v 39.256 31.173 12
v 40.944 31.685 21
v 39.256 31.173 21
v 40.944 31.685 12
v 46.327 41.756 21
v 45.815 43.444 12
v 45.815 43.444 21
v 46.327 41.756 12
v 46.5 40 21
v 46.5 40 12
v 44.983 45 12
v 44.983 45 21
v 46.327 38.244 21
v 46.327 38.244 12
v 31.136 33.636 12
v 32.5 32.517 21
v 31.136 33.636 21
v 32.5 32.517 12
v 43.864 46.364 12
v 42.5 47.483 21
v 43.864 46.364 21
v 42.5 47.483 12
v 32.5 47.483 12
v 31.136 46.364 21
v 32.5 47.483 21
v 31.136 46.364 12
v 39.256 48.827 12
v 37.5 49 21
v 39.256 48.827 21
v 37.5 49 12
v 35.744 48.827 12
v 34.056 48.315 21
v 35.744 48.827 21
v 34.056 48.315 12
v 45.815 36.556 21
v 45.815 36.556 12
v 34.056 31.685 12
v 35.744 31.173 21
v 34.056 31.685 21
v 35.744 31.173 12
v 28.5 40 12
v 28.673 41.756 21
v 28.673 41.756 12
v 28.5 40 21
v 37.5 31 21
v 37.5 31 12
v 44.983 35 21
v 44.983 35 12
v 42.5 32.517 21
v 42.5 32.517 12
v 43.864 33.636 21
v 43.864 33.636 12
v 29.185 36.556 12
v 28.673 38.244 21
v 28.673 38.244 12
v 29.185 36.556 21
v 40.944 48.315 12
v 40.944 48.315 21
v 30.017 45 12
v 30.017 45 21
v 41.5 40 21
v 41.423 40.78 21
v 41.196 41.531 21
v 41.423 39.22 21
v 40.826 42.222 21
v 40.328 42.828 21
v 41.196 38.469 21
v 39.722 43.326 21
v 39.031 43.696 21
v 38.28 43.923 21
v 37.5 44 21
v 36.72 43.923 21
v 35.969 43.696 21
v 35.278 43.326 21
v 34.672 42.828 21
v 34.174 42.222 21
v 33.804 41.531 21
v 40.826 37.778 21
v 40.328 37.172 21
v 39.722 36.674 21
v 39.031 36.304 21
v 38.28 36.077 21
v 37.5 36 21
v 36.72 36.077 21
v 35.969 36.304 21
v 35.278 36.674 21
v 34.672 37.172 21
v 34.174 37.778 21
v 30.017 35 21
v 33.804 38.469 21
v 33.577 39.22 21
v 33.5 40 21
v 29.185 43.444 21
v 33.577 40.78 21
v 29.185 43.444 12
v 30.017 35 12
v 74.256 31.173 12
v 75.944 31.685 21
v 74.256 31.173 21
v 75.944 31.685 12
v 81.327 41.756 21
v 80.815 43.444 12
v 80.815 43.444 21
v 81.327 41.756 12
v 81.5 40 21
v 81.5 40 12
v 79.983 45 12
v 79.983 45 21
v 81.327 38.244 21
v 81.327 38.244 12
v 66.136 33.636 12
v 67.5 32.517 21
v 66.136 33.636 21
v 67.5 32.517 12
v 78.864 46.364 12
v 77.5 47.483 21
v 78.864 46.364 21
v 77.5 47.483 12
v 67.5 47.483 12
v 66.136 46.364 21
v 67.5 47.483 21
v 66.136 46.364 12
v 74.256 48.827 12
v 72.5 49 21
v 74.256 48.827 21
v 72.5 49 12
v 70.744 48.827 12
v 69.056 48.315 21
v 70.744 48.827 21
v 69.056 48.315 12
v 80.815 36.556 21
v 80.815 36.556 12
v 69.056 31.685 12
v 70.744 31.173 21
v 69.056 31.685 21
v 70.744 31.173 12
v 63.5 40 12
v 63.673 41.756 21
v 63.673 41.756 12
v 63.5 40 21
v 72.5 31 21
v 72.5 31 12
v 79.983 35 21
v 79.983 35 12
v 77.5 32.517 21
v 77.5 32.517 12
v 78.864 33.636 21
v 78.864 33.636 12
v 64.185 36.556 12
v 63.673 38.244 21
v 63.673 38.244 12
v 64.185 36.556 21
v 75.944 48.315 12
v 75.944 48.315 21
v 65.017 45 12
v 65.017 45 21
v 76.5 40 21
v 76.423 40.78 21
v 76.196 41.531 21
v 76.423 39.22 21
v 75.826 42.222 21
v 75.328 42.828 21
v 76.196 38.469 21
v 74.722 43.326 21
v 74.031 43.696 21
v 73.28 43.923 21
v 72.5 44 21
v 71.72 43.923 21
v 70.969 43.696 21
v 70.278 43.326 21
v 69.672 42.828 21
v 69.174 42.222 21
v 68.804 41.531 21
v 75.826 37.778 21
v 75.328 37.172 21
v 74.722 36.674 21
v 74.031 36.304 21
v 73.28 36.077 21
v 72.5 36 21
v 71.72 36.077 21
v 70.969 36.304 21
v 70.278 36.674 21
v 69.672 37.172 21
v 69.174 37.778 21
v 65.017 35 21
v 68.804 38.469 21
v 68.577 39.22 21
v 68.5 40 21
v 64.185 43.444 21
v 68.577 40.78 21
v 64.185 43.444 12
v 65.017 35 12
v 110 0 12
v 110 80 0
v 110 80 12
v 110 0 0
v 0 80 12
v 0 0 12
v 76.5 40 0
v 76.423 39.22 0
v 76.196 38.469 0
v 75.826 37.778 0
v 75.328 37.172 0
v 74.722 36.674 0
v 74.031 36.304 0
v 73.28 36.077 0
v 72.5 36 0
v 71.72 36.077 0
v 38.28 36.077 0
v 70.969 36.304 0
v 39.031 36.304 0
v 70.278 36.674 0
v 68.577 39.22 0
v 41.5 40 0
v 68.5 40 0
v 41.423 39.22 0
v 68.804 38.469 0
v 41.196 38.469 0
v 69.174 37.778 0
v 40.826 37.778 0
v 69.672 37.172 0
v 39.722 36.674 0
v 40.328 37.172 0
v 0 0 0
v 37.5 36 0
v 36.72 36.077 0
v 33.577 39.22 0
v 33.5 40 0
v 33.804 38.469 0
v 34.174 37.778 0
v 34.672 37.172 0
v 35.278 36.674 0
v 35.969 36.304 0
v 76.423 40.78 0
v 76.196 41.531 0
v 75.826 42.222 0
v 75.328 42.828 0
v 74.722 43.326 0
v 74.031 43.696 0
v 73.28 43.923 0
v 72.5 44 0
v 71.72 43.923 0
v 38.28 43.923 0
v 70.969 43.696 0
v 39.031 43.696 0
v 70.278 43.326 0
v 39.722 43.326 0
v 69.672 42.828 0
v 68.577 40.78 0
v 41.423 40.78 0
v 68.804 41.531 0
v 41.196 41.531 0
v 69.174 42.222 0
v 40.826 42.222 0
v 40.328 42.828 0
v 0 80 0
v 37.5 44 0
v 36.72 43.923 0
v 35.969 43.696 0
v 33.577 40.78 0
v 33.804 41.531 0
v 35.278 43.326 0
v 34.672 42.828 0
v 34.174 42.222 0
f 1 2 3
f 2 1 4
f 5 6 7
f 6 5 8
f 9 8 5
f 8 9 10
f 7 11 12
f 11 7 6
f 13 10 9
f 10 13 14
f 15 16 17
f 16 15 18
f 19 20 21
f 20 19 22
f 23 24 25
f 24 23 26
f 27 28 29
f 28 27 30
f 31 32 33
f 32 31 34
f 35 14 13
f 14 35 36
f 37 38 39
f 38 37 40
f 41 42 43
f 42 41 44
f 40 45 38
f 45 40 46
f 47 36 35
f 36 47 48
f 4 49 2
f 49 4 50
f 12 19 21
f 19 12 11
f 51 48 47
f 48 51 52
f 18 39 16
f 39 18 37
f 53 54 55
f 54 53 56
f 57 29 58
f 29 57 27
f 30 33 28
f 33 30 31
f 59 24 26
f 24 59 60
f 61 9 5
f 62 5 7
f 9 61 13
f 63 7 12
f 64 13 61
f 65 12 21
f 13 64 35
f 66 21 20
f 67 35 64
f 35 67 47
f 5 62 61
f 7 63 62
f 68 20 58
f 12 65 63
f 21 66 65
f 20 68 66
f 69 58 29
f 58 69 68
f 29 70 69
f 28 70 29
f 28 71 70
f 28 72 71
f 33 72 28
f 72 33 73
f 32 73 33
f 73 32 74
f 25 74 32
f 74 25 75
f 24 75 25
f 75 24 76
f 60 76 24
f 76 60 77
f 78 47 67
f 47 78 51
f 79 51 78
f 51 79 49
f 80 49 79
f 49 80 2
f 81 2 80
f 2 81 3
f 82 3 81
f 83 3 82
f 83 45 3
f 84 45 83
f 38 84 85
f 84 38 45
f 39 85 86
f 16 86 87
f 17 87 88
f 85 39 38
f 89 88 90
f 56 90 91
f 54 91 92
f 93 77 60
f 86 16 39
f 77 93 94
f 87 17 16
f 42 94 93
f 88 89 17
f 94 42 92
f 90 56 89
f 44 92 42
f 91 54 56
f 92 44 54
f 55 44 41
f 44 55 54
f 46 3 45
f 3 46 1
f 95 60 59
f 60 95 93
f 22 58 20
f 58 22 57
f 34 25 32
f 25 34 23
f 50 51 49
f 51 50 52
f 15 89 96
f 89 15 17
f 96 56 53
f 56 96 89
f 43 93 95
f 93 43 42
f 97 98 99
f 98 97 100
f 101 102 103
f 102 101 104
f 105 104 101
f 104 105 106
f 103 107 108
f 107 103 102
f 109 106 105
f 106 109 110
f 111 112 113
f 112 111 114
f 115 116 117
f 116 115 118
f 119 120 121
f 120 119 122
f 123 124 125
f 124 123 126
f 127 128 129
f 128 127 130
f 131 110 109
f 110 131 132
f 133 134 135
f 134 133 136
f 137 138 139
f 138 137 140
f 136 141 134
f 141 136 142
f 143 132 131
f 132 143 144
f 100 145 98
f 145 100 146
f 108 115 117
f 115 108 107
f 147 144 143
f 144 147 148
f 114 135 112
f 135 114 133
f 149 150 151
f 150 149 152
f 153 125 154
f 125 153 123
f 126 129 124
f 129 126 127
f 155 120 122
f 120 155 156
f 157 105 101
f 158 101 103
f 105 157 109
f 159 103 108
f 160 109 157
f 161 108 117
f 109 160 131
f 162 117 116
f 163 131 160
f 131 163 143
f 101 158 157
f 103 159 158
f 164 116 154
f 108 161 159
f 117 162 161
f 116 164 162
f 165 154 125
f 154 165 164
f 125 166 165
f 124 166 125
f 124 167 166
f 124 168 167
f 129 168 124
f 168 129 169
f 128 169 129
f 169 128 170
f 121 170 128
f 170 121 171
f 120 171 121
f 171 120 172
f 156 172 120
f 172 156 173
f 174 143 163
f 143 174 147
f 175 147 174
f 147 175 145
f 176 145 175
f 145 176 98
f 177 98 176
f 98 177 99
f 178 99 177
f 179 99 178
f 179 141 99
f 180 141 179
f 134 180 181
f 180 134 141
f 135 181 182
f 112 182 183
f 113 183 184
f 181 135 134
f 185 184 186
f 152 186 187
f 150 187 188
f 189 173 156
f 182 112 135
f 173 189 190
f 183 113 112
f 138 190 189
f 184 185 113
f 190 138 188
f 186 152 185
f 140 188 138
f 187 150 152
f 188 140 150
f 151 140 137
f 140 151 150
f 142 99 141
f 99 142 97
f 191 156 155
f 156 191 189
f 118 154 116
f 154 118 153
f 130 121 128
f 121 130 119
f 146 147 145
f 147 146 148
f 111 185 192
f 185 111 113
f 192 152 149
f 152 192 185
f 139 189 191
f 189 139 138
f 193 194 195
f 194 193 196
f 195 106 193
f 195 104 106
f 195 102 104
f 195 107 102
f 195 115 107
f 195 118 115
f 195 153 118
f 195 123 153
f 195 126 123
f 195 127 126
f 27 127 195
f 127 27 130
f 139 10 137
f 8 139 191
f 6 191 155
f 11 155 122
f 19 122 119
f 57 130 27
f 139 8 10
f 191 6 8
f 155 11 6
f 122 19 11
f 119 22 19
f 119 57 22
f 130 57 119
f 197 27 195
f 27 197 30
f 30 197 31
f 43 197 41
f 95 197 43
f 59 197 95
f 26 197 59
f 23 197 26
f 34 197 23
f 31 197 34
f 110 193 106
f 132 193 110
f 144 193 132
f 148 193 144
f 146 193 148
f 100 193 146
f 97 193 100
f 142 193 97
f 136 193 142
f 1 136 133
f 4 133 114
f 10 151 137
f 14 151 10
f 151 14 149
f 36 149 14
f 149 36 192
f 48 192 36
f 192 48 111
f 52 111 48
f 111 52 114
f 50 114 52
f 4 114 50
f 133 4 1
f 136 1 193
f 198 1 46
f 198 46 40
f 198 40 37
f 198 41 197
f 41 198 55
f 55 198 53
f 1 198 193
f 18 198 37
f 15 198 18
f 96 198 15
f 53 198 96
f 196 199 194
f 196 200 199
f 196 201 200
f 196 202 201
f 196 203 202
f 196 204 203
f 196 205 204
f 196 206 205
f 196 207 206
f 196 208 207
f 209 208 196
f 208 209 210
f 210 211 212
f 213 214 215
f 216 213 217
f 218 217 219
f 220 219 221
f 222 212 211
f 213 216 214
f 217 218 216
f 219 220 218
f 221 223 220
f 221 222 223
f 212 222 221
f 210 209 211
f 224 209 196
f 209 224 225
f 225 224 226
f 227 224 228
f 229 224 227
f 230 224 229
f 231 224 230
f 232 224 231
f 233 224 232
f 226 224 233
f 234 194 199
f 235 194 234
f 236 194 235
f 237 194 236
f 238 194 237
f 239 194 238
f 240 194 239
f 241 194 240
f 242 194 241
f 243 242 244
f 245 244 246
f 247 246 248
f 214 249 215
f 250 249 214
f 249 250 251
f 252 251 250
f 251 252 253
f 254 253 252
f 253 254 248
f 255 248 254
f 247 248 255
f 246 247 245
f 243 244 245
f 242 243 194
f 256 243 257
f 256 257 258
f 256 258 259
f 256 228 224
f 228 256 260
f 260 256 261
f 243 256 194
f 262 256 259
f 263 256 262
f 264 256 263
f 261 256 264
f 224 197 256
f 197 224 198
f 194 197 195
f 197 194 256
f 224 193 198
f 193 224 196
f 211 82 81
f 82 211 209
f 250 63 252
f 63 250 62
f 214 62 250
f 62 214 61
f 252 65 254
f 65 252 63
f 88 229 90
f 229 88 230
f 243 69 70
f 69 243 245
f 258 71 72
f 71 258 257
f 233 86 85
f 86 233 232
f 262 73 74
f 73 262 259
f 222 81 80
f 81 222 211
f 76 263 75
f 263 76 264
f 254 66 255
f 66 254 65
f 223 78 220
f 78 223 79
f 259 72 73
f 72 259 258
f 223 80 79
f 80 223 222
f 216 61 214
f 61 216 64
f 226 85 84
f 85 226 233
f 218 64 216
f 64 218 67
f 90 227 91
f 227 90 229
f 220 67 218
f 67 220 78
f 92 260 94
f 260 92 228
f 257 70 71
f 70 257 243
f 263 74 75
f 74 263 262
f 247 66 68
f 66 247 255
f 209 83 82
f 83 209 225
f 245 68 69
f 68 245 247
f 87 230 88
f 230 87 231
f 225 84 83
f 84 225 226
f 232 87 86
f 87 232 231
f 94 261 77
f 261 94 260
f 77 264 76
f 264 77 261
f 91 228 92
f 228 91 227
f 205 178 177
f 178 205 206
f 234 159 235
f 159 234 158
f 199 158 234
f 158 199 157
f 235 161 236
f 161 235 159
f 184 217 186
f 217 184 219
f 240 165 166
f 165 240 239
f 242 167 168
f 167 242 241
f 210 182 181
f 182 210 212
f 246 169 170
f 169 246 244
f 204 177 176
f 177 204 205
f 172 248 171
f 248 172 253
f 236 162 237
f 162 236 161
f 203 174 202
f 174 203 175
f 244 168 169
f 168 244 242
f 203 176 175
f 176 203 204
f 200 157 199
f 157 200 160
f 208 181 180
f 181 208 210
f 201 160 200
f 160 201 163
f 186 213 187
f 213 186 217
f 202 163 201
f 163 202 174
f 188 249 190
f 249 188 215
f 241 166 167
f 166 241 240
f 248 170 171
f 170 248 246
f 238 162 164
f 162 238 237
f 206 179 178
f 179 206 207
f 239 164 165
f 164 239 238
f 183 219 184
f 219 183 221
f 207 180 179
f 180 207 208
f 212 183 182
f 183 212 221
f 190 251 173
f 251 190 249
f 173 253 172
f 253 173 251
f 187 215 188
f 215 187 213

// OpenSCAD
$fn = 32;
// target_bbox: 110, 80, 21
// ----------------------------------------------------------------------
// Drill jig: two_boss jig
// ----------------------------------------------------------------------

// --- parameters (mm) ---
plate_l = 110;            // plate length, X
plate_w = 80;             // plate width, Y
plate_t = 12;             // plate thickness
boss_d = 18;              // guide boss diameter
boss_h = 10;              // boss height above the plate
guide_d = 8;              // guide hole diameter
boss_pitch = 35;          // boss pitch

n_boss = 2;  // guide bosses
boss_x0 = (plate_l - (n_boss - 1) * boss_pitch) / 2;  // first boss X
boss_top = plate_t - 1 + boss_h;  // boss crown height
total_h = boss_top;  // overall height

difference() {
  union() {
  cube([plate_l, plate_w, plate_t]);
  for (i = [0 : n_boss - 1])
    translate([boss_x0 + i * boss_pitch, plate_w / 2, plate_t - 1])
      cylinder(h = boss_h, d = boss_d);
  }
  for (i = [0 : n_boss - 1])
    translate([boss_x0 + i * boss_pitch, plate_w / 2, -1])
      cylinder(h = plate_t + boss_h, d = guide_d);
}
